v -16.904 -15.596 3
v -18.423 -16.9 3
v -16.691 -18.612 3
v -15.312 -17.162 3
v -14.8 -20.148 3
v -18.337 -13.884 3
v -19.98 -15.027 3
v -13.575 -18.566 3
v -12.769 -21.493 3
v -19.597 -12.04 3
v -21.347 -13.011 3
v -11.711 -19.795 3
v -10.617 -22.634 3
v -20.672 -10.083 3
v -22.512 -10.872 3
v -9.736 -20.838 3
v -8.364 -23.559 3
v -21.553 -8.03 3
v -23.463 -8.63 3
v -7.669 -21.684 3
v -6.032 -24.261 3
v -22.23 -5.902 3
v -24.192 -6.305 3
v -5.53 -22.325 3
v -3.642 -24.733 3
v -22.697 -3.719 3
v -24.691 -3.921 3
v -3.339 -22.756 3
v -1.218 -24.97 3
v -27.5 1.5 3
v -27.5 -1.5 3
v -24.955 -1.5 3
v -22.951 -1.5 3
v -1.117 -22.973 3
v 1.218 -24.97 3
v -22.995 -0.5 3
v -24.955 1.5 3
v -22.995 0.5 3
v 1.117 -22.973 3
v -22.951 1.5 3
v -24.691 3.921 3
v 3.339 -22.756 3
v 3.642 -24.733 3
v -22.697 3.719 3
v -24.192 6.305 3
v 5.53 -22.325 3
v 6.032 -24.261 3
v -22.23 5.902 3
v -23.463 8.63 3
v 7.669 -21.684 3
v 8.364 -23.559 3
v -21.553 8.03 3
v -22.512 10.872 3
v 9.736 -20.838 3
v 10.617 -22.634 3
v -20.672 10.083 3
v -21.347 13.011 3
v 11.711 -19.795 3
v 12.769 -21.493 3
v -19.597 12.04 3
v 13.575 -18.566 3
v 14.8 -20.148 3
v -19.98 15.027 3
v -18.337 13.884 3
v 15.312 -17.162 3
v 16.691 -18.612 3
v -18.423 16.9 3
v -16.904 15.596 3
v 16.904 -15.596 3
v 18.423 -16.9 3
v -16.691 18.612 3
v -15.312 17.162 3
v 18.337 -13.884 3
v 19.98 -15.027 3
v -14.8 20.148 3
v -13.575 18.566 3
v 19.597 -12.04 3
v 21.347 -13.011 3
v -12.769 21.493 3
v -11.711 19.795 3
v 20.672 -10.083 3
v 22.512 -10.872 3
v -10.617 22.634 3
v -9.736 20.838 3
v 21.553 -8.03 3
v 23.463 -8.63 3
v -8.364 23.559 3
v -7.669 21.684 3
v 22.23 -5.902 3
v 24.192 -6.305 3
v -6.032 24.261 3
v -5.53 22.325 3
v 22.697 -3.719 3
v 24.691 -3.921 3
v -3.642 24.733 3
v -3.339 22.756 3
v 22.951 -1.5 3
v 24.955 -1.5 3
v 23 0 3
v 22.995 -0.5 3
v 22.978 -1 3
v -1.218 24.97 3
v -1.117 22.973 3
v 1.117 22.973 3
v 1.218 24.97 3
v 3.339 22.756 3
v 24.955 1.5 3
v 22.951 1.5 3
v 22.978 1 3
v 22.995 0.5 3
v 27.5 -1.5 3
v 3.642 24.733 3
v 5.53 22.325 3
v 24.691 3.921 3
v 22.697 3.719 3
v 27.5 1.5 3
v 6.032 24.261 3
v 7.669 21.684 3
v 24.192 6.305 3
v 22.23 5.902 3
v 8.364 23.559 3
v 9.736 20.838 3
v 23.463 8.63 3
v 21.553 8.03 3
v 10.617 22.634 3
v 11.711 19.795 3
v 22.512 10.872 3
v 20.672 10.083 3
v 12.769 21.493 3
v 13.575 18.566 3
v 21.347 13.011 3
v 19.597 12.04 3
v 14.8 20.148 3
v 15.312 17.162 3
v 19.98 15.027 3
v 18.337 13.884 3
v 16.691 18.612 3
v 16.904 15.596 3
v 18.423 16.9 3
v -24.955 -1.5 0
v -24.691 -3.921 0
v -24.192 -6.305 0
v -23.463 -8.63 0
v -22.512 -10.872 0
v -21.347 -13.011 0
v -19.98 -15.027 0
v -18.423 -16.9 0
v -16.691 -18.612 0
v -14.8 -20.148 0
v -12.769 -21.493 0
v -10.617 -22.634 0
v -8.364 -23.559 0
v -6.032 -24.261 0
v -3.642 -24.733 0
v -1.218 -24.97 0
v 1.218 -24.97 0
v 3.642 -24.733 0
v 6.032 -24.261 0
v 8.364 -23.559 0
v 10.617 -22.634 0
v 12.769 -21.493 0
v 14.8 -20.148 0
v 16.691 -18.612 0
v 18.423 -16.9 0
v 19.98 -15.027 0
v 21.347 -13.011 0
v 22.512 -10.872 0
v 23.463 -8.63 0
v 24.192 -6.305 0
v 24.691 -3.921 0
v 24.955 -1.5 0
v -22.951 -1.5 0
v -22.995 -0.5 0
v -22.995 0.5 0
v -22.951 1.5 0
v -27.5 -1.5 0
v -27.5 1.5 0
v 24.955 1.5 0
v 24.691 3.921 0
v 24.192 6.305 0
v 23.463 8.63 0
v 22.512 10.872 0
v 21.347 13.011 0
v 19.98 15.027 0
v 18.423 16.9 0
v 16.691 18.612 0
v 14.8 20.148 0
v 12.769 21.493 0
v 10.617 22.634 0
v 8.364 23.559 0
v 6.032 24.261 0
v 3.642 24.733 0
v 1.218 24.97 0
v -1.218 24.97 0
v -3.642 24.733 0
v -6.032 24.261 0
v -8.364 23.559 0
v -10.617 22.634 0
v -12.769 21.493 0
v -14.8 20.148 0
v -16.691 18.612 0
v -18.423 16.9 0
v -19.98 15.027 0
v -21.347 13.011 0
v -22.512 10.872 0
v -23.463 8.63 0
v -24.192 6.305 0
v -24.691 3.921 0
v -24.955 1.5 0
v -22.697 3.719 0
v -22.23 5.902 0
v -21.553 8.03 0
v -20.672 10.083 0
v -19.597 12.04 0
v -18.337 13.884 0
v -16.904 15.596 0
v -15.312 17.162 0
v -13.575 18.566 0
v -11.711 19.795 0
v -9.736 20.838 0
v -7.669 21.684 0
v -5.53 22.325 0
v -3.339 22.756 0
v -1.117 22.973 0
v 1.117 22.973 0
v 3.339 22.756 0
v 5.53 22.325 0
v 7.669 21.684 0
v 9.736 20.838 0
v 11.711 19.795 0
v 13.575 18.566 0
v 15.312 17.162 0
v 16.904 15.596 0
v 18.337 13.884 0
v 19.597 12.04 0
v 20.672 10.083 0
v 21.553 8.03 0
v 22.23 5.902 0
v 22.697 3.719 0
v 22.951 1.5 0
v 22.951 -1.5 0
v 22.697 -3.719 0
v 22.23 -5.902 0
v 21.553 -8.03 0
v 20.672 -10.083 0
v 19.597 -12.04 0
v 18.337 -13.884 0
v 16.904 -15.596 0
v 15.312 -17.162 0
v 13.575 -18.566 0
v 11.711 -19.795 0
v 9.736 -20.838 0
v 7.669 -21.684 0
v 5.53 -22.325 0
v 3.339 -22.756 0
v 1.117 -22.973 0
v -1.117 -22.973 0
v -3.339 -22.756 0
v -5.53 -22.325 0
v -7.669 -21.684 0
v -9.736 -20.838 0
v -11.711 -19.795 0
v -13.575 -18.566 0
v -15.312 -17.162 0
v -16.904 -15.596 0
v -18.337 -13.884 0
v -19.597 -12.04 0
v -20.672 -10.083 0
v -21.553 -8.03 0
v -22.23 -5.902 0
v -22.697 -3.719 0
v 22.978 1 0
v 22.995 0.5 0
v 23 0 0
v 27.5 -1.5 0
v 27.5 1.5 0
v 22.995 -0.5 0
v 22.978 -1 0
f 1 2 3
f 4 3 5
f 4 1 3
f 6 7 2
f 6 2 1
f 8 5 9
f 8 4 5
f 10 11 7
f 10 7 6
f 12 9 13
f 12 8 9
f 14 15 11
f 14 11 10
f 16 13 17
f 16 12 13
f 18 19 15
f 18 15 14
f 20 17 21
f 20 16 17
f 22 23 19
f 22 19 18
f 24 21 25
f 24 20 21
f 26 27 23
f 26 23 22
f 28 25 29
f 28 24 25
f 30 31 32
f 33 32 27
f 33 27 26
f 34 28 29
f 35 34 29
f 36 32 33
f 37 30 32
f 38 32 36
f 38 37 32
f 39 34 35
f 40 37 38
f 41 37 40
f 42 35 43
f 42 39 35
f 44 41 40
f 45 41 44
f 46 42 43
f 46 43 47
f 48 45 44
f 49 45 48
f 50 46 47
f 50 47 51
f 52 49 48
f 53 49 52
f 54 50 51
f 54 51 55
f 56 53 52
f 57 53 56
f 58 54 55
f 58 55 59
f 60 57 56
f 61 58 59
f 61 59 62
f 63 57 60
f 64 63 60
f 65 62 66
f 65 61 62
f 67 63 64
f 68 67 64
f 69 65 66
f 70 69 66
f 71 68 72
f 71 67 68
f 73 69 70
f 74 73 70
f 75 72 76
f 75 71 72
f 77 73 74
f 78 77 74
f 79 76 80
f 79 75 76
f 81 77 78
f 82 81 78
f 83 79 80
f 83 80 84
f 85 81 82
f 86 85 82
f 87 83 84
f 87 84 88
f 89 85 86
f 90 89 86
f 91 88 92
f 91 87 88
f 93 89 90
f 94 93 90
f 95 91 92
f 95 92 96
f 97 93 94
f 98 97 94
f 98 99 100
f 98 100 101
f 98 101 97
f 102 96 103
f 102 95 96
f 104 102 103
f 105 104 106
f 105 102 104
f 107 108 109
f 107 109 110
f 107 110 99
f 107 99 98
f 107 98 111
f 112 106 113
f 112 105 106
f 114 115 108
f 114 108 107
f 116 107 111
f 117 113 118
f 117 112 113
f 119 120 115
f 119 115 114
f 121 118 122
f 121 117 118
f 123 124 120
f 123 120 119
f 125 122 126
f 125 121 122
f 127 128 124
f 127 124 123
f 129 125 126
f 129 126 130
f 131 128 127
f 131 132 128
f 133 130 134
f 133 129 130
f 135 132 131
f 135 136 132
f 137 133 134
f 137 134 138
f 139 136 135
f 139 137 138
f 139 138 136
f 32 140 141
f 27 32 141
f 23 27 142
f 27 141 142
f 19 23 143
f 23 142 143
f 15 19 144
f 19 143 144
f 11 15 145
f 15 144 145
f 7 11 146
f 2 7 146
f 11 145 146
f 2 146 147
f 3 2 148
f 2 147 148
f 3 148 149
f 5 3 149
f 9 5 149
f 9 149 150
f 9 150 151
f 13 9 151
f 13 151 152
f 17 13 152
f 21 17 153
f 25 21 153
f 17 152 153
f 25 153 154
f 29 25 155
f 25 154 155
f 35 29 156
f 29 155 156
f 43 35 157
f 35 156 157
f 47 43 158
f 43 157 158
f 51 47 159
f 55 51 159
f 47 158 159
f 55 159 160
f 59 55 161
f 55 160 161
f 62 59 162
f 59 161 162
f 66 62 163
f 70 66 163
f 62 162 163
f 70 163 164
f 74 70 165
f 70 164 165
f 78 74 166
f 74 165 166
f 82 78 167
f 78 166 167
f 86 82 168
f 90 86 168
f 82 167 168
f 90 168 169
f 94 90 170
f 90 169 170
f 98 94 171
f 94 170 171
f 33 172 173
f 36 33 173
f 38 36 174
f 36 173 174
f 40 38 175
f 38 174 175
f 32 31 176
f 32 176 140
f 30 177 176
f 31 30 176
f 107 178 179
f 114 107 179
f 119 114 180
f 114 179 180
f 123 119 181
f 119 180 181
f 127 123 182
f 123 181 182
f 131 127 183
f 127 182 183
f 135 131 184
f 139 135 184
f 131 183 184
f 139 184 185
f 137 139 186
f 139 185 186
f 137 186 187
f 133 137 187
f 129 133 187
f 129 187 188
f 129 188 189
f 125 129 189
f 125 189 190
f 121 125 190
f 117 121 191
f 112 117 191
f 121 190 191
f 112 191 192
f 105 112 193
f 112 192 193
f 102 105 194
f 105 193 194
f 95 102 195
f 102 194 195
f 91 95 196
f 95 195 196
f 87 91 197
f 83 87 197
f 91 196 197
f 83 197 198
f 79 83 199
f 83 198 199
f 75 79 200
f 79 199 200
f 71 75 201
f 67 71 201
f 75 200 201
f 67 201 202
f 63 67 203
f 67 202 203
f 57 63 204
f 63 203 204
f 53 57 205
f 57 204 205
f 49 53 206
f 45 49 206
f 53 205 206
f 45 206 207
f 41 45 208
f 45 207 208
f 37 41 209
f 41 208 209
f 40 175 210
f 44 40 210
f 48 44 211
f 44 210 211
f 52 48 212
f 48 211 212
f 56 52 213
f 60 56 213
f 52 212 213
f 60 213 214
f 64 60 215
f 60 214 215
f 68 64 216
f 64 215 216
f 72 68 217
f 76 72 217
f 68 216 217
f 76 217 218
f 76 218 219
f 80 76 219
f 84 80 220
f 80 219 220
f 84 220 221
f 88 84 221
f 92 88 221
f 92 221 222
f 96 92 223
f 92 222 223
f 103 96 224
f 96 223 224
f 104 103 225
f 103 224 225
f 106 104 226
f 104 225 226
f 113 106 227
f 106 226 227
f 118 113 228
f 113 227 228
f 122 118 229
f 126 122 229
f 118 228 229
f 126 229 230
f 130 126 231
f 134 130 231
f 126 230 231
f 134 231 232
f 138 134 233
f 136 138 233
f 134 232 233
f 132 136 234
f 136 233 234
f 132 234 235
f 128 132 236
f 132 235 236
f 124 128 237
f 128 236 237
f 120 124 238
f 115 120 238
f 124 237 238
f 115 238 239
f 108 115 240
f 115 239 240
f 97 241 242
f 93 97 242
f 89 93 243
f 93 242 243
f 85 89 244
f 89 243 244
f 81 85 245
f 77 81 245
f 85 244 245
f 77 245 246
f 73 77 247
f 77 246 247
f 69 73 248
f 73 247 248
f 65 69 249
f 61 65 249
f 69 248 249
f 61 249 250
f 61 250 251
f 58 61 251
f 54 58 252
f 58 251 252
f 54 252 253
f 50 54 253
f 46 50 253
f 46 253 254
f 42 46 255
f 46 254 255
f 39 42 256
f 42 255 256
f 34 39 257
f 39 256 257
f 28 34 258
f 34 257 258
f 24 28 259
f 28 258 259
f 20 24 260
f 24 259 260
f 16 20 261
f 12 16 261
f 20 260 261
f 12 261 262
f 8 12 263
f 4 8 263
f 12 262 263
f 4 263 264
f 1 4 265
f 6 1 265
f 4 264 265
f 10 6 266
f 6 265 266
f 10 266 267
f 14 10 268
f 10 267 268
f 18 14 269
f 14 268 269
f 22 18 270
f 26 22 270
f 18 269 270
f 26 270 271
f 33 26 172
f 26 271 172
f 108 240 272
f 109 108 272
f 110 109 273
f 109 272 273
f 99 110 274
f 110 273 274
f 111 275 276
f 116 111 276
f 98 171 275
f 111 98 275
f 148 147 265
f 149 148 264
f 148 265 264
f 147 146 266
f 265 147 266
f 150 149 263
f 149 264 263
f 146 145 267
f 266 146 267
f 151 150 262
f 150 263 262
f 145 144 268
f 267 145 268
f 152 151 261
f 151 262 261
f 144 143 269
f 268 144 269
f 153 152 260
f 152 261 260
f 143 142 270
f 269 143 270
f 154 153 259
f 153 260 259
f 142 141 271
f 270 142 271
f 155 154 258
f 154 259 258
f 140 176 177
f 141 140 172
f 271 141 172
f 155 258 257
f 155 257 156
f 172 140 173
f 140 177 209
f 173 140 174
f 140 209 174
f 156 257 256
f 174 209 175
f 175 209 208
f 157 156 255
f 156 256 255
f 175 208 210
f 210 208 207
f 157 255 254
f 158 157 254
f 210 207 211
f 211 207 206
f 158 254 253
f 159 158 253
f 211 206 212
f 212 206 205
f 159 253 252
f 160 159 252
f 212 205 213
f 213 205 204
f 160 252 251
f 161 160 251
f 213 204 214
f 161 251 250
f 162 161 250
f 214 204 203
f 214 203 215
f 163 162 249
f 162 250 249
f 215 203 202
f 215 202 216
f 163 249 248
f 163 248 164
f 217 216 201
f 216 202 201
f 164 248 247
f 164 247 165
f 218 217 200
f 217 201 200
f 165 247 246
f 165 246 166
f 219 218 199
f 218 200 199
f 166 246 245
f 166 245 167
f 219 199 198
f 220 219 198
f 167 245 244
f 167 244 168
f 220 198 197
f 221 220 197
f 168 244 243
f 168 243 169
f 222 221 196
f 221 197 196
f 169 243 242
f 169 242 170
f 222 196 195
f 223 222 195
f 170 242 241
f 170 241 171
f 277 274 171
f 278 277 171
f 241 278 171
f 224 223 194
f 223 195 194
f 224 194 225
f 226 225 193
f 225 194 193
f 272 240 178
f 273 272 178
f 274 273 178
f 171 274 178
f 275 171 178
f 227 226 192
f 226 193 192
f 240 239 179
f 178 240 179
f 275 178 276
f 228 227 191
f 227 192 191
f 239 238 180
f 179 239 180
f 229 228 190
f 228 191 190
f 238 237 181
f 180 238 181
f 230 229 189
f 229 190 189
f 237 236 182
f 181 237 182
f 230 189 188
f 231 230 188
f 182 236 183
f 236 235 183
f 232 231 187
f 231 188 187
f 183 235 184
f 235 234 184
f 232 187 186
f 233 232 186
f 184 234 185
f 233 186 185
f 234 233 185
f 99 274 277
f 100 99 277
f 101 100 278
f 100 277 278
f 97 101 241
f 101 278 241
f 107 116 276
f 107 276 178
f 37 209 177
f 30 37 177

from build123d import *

# Parameters (mm, degrees)
F1_DEPTH = 3


with BuildPart() as f1:
    # F0 (on Top) → F1 (new body)
    with BuildSketch(Plane.XY):
        with BuildLine():
            Line((22.9510348351, 1.5), (24.9549594269, 1.5))
            ThreePointArc((24.9549594269, 1.5), (0, 25), (-24.9549594269, 1.5))
            Line((-24.9549594269, 1.5), (-22.9510348351, 1.5))
            ThreePointArc((-22.9510348351, 1.5), (0, 23), (22.9510348351, 1.5))
        make_face()
        with BuildLine():
            Line((-22.9510348351, 1.5), (-24.9549594269, 1.5))
            ThreePointArc((-24.9549594269, 1.5), (-25, 0), (-24.9549594269, -1.5))
            Line((-24.9549594269, -1.5), (-22.9510348351, -1.5))
            ThreePointArc((-22.9510348351, -1.5), (-23, 0), (-22.9510348351, 1.5))
        make_face()
        with BuildLine():
            ThreePointArc((-24.9549594269, -1.5), (0, -25), (24.9549594269, -1.5))
            Line((24.9549594269, -1.5), (22.9510348351, -1.5))
            ThreePointArc((22.9510348351, -1.5), (0, -23), (-22.9510348351, -1.5))
            Line((-22.9510348351, -1.5), (-24.9549594269, -1.5))
        make_face()
        with BuildLine():
            ThreePointArc((24.9549594269, -1.5), (24.9887373198, -0.7503380327), (25, 0))
            ThreePointArc((25, 0), (24.9887373198, 0.7503380327), (24.9549594269, 1.5))
            Line((24.9549594269, 1.5), (22.9510348351, 1.5))
            ThreePointArc((22.9510348351, 1.5), (22.9877554494, 0.7503994915), (23, 0))
            ThreePointArc((23, 0), (22.9877554494, -0.7503994915), (22.9510348351, -1.5))
            Line((22.9510348351, -1.5), (24.9549594269, -1.5))
        make_face()
        with BuildLine():
            ThreePointArc((24.9549594269, 1.5), (24.9887373198, 0.7503380327), (25, 0))
            ThreePointArc((25, 0), (24.9887373198, -0.7503380327), (24.9549594269, -1.5))
            Line((24.9549594269, -1.5), (27.5, -1.5))
            Line((27.5, -1.5), (27.5, 1.5))
            Line((27.5, 1.5), (24.9549594269, 1.5))
        make_face()
        with BuildLine():
            ThreePointArc((-24.9549594269, -1.5), (-25, 0), (-24.9549594269, 1.5))
            Line((-24.9549594269, 1.5), (-27.5, 1.5))
            Line((-27.5, 1.5), (-27.5, -1.5))
            Line((-27.5, -1.5), (-24.9549594269, -1.5))
        make_face()
    extrude(amount=F1_DEPTH)


solid = f1.part
